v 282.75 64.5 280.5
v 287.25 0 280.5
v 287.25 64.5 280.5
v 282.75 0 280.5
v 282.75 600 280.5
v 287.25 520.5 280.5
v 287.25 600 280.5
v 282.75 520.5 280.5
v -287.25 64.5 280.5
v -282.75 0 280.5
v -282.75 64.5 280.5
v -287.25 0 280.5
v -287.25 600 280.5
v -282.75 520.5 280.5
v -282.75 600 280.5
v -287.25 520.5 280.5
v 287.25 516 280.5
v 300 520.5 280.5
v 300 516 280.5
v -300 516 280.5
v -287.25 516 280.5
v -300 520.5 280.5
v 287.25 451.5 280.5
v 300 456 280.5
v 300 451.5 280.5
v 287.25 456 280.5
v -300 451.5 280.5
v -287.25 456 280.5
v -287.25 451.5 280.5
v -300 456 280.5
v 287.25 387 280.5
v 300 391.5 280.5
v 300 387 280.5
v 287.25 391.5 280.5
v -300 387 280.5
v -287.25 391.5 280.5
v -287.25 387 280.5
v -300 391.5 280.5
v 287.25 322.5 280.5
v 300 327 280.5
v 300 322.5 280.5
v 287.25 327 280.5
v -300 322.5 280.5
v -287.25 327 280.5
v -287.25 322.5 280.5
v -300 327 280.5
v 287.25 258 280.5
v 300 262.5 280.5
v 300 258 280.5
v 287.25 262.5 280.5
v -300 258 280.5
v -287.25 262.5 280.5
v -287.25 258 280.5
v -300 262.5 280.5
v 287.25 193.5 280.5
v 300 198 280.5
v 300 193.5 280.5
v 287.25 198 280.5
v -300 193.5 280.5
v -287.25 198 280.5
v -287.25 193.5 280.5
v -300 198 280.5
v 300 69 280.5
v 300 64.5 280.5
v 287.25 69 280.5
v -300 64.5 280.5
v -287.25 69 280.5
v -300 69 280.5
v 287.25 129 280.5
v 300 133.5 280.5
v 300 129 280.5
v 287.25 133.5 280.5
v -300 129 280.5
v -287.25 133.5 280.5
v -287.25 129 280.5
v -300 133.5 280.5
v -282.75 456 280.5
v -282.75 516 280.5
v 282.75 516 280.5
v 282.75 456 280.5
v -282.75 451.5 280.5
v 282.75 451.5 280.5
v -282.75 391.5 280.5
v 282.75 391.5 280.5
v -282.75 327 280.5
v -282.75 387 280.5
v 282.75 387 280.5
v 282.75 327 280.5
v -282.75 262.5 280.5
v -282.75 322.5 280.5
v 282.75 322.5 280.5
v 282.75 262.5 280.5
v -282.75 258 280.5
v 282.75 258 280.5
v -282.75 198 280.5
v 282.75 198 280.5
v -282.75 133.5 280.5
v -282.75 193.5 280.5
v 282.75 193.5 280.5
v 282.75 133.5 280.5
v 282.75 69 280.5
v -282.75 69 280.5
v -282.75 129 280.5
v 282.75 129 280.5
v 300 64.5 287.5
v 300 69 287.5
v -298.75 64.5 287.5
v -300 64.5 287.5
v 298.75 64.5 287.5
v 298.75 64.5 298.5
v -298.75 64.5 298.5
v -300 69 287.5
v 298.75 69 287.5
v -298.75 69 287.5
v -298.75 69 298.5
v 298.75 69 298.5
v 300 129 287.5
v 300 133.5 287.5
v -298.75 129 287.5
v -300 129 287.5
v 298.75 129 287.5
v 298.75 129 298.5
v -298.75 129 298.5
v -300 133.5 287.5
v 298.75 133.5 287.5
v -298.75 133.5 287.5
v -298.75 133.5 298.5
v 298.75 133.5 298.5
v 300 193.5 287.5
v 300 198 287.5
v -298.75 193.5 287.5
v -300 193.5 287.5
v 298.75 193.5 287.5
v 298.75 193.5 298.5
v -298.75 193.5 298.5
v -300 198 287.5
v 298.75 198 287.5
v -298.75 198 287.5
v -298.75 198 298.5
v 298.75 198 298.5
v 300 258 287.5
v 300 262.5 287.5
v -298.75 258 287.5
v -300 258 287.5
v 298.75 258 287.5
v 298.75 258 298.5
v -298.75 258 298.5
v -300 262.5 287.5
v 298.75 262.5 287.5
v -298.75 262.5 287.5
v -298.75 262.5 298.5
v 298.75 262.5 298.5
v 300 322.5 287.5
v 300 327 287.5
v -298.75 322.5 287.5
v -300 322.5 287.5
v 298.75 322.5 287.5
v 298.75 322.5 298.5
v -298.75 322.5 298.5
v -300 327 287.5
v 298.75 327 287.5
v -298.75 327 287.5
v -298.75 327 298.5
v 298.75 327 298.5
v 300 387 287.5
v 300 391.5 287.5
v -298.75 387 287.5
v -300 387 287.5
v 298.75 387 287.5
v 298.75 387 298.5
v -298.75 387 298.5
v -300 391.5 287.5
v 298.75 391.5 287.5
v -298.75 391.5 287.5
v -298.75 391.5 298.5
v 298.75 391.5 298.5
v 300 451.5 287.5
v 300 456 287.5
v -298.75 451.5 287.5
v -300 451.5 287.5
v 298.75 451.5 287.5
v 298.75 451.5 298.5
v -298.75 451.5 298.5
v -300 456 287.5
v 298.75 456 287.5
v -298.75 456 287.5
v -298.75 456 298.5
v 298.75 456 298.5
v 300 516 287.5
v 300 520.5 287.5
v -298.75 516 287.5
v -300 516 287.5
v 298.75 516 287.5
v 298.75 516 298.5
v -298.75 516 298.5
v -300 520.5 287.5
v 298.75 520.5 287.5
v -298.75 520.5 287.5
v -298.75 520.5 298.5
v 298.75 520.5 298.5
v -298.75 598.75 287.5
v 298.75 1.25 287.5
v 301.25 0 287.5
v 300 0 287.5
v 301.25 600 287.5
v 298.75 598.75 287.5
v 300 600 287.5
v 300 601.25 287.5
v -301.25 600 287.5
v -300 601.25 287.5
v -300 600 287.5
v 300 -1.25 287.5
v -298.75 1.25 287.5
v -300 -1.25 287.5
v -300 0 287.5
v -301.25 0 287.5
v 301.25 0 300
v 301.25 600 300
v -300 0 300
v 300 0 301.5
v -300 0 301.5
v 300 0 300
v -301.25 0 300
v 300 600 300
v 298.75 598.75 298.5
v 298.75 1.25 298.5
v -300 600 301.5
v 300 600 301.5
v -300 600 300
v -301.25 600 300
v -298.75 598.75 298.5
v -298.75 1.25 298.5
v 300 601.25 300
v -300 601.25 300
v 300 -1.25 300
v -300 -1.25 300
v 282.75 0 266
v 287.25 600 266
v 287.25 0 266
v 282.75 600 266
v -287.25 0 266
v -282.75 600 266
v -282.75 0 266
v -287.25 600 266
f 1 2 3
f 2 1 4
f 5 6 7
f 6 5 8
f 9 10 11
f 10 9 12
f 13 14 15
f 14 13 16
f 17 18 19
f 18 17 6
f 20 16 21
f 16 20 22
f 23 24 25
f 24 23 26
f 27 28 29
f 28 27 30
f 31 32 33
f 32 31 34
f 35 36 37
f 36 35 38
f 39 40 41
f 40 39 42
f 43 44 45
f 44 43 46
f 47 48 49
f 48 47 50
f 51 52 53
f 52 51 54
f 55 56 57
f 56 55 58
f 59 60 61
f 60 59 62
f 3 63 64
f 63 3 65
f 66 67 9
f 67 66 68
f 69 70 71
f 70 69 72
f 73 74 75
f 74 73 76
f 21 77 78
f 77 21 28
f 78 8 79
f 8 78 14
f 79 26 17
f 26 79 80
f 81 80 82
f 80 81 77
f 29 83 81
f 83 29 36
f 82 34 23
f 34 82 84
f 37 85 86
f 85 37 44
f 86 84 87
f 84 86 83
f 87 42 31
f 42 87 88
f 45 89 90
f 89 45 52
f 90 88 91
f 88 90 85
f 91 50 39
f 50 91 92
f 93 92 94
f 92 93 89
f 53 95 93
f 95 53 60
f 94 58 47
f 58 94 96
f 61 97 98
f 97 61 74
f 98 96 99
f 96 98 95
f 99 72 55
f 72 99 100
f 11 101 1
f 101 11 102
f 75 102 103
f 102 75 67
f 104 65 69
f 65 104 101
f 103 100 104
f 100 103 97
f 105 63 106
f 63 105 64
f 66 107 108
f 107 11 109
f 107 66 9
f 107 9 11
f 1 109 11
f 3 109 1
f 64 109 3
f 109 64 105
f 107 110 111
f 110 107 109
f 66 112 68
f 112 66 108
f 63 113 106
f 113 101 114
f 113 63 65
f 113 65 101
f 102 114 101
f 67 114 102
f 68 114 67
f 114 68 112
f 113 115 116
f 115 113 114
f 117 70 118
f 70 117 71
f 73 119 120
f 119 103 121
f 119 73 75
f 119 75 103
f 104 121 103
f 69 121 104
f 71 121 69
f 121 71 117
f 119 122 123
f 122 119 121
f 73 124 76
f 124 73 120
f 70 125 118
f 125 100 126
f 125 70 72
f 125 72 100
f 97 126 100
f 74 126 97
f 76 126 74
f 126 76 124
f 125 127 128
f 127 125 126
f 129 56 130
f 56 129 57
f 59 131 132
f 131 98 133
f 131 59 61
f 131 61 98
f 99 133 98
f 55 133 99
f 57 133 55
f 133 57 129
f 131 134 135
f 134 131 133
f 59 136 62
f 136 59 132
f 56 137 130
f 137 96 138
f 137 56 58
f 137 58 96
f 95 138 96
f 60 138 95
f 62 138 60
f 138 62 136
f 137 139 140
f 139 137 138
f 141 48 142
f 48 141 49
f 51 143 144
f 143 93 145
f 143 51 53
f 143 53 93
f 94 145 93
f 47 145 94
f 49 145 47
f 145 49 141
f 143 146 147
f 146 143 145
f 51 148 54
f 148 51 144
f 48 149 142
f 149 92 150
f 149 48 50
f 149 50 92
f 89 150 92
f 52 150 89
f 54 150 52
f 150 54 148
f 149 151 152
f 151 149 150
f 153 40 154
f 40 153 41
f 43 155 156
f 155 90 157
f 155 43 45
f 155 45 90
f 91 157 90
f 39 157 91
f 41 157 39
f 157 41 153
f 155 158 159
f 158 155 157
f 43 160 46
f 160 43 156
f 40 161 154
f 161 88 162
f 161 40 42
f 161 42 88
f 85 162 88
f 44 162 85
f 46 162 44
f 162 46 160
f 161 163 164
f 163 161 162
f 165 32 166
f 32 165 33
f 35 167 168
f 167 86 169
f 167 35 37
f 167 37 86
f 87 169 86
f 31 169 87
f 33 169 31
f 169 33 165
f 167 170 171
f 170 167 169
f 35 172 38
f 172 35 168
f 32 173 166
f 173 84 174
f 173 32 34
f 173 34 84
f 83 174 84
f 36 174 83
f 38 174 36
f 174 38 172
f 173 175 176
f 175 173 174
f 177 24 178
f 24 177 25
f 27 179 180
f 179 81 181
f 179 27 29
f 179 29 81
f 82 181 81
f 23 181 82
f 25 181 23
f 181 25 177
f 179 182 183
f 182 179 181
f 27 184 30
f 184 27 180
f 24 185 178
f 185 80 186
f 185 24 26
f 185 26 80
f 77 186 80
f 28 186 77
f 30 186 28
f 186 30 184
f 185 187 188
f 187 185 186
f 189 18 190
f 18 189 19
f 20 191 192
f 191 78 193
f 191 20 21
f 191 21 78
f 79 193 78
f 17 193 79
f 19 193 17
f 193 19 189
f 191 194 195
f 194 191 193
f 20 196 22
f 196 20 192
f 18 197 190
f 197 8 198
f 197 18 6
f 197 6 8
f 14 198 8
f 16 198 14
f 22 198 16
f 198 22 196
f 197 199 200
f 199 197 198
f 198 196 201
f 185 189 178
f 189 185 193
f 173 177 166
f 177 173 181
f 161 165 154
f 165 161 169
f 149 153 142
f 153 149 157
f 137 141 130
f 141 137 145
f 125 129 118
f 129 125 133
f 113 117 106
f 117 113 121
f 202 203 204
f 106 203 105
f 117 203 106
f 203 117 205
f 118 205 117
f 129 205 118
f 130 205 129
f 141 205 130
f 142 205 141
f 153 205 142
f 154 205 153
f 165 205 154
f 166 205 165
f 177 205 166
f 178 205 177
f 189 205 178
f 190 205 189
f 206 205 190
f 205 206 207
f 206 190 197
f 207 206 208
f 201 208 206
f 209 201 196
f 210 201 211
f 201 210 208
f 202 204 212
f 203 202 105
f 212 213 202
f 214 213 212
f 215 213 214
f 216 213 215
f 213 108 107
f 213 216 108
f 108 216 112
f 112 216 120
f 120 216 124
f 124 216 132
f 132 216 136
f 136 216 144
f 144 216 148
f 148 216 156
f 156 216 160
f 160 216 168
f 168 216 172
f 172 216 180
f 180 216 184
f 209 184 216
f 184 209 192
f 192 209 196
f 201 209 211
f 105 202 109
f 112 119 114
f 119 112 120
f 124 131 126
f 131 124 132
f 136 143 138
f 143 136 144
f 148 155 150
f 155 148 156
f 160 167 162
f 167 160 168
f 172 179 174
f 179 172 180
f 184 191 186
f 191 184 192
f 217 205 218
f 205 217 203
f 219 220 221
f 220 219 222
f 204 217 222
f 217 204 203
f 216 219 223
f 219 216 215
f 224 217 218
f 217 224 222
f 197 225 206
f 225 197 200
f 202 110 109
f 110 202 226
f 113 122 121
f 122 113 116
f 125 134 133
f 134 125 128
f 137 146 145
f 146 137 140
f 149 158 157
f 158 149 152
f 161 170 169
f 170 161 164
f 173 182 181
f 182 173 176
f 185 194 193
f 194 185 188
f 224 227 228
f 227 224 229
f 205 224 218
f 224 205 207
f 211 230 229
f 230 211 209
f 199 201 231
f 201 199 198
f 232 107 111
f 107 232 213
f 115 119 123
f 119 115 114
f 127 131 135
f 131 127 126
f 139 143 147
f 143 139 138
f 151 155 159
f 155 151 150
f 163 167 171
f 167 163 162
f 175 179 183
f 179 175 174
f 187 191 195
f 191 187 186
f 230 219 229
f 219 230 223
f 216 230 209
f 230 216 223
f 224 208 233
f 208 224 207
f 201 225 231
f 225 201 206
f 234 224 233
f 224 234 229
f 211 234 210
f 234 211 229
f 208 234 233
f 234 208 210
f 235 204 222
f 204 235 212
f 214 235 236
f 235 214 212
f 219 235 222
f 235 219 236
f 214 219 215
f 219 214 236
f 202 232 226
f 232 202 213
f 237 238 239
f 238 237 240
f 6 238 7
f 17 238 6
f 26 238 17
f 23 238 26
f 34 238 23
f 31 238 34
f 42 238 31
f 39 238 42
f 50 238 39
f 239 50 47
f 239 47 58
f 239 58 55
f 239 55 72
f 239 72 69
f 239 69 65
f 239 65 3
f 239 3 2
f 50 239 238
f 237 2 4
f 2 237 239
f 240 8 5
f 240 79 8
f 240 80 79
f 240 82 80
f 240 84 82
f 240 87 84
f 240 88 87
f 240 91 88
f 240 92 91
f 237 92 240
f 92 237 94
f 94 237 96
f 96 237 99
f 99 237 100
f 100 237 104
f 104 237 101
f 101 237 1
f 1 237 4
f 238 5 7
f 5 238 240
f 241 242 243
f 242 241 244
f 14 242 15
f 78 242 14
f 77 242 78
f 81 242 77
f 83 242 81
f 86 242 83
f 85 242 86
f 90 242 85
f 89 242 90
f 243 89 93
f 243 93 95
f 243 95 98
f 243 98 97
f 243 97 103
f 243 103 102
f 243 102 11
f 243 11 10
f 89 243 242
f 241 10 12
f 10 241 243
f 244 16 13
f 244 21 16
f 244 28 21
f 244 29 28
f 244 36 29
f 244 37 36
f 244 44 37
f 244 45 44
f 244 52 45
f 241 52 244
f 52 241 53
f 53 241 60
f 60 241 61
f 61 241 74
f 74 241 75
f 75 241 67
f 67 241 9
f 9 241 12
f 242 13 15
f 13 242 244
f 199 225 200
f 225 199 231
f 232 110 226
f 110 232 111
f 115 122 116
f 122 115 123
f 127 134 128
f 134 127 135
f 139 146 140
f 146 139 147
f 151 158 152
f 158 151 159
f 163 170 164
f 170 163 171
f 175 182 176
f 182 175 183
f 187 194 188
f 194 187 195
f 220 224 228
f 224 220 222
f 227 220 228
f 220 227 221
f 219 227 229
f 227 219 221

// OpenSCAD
union()
{
    translate([0.0, 0.0, 290.25])
    {
        union()
        {
            union()
            {
                union()
                {
                    union()
                    {
                        union()
                        {
                            union()
                            {
                                union()
                                {
                                    union()
                                    {
                                        linear_extrude(height = 0.0, twist = 0.0, scale = 1.0, slices = 1, center = true)
                                        {
                                            scale([0.0, 0.0])
                                            {
                                                M8();
                                            }
                                        }
                                        translate([0.0, 66.75, 0.0])
                                        {
                                            linear_extrude(height = 19.5, twist = 0.0, scale = 1.0, slices = 1, center = true)
                                            {
                                                scale([600.0, 4.5])
                                                {
                                                    M8();
                                                }
                                            }
                                        }
                                    }
                                    translate([0.0, 131.25, 0.0])
                                    {
                                        linear_extrude(height = 19.5, twist = 0.0, scale = 1.0, slices = 1, center = true)
                                        {
                                            scale([600.0, 4.5])
                                            {
                                                M8();
                                            }
                                        }
                                    }
                                }
                                translate([0.0, 195.75, 0.0])
                                {
                                    linear_extrude(height = 19.5, twist = 0.0, scale = 1.0, slices = 1, center = true)
                                    {
                                        scale([600.0, 4.5])
                                        {
                                            M8();
                                        }
                                    }
                                }
                            }
                            translate([0.0, 260.25, 0.0])
                            {
                                linear_extrude(height = 19.5, twist = 0.0, scale = 1.0, slices = 1, center = true)
                                {
                                    scale([600.0, 4.5])
                                    {
                                        M8();
                                    }
                                }
                            }
                        }
                        translate([0.0, 324.75, 0.0])
                        {
                            linear_extrude(height = 19.5, twist = 0.0, scale = 1.0, slices = 1, center = true)
                            {
                                scale([600.0, 4.5])
                                {
                                    M8();
                                }
                            }
                        }
                    }
                    translate([0.0, 389.25, 0.0])
                    {
                        linear_extrude(height = 19.5, twist = 0.0, scale = 1.0, slices = 1, center = true)
                        {
                            scale([600.0, 4.5])
                            {
                                M8();
                            }
                        }
                    }
                }
                translate([0.0, 453.75, 0.0])
                {
                    linear_extrude(height = 19.5, twist = 0.0, scale = 1.0, slices = 1, center = true)
                    {
                        scale([600.0, 4.5])
                        {
                            M8();
                        }
                    }
                }
            }
            translate([0.0, 518.25, 0.0])
            {
                linear_extrude(height = 19.5, twist = 0.0, scale = 1.0, slices = 1, center = true)
                {
                    scale([600.0, 4.5])
                    {
                        M8();
                    }
                }
            }
        }
    }
    translate([0.0, 300.0, 300.0])
    {
        linear_extrude(height = 3.0, twist = 0.0, scale = 1.0, slices = 1, center = true)
        {
            scale([600.0, 600.0])
            {
                M8();
            }
        }
    }
    translate([0.0, 300.0, 293.75])
    {
        union()
        {
            translate([300.0, 0.0, 0.0])
            {
                linear_extrude(height = 12.5, twist = 0.0, scale = 1.0, slices = 1, center = true)
                {
                    scale([2.5, 600.0])
                    {
                        M8();
                    }
                }
            }
            translate([-300.0, 0.0, 0.0])
            {
                linear_extrude(height = 12.5, twist = 0.0, scale = 1.0, slices = 1, center = true)
                {
                    scale([2.5, 600.0])
                    {
                        M8();
                    }
                }
            }
        }
    }
    translate([0.0, 0.0, 293.75])
    {
        union()
        {
            translate([0.0, 600.0, 0.0])
            {
                linear_extrude(height = 12.5, twist = 0.0, scale = 1.0, slices = 1, center = true)
                {
                    scale([600.0, 2.5])
                    {
                        M8();
                    }
                }
            }
            translate([0.0, 0.0, 0.0])
            {
                linear_extrude(height = 12.5, twist = 0.0, scale = 1.0, slices = 1, center = true)
                {
                    scale([600.0, 2.5])
                    {
                        M8();
                    }
                }
            }
        }
    }
    translate([0.0, 300.0, 273.25])
    {
        union()
        {
            translate([285.0, 0.0, 0.0])
            {
                linear_extrude(height = 14.5, twist = 0.0, scale = 1.0, slices = 1, center = true)
                {
                    scale([4.5, 600.0])
                    {
                        M8();
                    }
                }
            }
            translate([-285.0, 0.0, 0.0])
            {
                linear_extrude(height = 14.5, twist = 0.0, scale = 1.0, slices = 1, center = true)
                {
                    scale([4.5, 600.0])
                    {
                        M8();
                    }
                }
            }
        }
    }
}

module M8()
{
    polygon
    (
        points =
        [
            [-0.5, -0.5], 
            [0.5, -0.5], 
            [0.5, 0.5], 
            [-0.5, 0.5]
        ],
        paths =
        [
            [0, 1, 2, 3]
        ]
    );
}
